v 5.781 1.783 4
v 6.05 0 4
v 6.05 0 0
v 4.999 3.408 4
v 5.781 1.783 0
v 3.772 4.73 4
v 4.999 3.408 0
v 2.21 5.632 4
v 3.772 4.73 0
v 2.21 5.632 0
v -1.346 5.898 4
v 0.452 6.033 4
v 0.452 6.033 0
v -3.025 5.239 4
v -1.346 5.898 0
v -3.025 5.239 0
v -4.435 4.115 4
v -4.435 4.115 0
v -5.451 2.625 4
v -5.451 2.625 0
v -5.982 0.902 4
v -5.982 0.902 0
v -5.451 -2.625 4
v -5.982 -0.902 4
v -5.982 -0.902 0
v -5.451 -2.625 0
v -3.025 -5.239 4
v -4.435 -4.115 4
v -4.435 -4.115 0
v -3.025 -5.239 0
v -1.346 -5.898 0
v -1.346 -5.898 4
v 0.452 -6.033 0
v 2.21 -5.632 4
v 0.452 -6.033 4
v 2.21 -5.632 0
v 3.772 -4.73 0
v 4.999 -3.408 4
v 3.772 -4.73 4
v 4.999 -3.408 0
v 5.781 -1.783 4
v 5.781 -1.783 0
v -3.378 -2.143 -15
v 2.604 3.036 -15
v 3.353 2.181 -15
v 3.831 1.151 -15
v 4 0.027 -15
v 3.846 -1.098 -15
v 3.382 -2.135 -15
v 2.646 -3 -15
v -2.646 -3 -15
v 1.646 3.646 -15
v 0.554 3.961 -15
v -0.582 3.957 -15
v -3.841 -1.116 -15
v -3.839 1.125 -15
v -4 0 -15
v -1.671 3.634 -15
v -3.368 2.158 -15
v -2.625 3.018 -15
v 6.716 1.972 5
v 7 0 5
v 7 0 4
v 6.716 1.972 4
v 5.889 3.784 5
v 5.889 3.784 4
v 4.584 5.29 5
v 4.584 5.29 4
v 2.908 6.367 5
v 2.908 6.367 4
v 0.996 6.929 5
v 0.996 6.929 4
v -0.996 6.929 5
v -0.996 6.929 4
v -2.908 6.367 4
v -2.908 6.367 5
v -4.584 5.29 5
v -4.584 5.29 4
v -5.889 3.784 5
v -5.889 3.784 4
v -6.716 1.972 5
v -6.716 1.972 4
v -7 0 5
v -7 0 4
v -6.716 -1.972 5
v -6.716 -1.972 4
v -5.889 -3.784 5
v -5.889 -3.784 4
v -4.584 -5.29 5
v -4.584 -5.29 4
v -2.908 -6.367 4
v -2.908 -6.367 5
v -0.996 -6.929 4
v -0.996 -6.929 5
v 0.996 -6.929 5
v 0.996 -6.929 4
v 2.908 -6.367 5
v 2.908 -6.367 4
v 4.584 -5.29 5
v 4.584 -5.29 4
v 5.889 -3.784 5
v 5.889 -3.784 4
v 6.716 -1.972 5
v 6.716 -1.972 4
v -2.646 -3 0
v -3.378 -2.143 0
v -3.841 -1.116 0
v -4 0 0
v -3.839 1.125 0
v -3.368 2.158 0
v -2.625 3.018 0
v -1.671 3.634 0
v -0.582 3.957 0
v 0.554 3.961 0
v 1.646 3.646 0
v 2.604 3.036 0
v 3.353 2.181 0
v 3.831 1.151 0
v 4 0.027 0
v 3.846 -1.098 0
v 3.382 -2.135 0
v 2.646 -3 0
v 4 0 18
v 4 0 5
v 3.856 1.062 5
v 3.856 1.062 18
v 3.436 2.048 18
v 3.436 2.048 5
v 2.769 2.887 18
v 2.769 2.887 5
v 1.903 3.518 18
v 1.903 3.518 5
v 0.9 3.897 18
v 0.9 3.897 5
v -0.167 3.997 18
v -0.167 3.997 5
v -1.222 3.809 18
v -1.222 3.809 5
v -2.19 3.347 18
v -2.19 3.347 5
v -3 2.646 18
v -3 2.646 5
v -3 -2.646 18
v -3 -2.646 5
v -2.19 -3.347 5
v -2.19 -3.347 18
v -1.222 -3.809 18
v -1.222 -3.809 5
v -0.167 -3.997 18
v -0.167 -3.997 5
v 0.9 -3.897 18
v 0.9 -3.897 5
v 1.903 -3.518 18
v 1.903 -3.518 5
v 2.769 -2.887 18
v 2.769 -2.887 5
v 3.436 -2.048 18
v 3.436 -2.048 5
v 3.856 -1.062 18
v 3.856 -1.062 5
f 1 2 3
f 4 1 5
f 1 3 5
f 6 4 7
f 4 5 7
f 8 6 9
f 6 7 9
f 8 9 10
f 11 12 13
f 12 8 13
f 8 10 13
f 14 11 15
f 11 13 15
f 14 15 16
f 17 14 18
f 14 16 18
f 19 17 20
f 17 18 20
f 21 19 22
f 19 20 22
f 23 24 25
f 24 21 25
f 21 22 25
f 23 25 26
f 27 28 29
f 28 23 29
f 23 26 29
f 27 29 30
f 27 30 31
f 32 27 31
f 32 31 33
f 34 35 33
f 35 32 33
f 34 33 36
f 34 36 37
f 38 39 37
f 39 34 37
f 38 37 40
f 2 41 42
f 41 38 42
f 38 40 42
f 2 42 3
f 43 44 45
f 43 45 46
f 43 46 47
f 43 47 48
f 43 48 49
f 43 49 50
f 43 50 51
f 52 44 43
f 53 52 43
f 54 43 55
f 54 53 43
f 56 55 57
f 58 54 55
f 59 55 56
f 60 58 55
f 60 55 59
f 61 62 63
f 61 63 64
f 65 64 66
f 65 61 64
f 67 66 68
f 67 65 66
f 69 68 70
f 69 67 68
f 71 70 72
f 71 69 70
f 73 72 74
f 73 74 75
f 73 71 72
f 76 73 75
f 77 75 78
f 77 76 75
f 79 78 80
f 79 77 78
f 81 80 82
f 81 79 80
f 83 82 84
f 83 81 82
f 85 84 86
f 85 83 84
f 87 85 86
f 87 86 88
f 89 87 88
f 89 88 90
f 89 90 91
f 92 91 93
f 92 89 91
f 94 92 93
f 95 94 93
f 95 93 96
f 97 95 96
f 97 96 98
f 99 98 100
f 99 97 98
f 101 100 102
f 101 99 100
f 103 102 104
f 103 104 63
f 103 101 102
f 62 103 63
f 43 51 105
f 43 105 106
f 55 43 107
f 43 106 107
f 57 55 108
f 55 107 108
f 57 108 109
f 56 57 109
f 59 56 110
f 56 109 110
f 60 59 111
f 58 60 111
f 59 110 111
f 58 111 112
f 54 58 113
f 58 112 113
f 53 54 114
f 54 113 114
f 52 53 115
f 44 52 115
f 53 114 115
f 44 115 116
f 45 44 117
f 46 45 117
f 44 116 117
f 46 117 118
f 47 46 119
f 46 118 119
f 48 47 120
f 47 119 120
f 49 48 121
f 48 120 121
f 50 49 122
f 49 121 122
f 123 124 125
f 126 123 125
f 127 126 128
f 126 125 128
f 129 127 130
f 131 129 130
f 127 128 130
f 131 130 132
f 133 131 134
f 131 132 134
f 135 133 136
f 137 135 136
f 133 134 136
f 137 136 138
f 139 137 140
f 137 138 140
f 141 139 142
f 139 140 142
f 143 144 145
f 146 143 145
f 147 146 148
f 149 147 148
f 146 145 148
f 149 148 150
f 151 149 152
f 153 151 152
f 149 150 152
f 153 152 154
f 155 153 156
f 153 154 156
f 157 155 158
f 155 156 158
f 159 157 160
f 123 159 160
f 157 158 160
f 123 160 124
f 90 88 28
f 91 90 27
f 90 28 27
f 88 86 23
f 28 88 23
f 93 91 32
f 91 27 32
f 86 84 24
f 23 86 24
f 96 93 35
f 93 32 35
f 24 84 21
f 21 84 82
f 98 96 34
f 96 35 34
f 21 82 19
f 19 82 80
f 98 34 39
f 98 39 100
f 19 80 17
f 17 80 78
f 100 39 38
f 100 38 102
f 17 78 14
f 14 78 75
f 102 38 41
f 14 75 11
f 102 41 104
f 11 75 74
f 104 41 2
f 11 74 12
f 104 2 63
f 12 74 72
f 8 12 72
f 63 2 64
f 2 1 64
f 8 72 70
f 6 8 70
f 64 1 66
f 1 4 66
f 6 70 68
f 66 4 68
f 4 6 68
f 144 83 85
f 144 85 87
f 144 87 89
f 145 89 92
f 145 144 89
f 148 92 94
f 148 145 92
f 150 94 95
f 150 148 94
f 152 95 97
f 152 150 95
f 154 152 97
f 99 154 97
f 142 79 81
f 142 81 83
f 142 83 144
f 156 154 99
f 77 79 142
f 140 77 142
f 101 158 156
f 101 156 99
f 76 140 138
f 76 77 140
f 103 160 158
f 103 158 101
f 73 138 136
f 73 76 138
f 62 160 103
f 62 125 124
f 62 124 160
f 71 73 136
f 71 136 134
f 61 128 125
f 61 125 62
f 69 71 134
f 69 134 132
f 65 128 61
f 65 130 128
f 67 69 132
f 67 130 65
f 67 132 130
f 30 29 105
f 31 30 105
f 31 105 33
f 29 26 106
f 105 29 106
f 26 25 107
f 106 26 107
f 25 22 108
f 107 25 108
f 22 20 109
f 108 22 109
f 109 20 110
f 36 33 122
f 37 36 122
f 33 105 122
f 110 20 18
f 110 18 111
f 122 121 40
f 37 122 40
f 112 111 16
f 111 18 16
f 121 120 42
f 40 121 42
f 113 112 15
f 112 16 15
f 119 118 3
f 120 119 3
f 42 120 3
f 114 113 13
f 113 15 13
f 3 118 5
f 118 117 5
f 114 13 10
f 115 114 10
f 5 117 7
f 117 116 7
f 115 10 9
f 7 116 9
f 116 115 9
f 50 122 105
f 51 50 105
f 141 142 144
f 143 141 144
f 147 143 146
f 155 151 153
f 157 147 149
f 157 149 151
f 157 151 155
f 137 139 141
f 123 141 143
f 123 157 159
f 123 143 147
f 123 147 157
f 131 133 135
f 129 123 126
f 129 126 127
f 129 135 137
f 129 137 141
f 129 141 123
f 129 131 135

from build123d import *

# Parameters (mm, degrees)
SKETCH_1_R      = 6.05
EXTRUDE_1_DEPTH = 5
SKETCH_7_R      = 7
EXTRUDE_6_DEPTH = 1
EXTRUDE_2_DEPTH = 13
EXTRUDE_3_DEPTH = 15


with BuildPart() as part:
    # 草图1 → 凸台-拉伸1 (new body)
    with BuildSketch(Plane.XY):
        Circle(SKETCH_1_R)
    extrude(amount=EXTRUDE_1_DEPTH)

    # 草图7 → 凸台-拉伸6 (add)
    with BuildSketch(Plane.XY.offset(5)):
        Circle(SKETCH_7_R)
    extrude(amount=-EXTRUDE_6_DEPTH)

    # 草图2 → 凸台-拉伸2 (add)
    with BuildSketch(Plane.XY.offset(5)):
        with BuildLine():
            ThreePointArc((4, 0), (1.414213562, 3.741657387), (-3, 2.645751311))
            Line((-3, 2.645751311), (-3, -2.645751311))
            ThreePointArc((-3, -2.645751311), (1.414213562, -3.741657387), (4, 0))
        make_face()
    extrude(amount=EXTRUDE_2_DEPTH)

    # 草图4 → 凸台-拉伸3 (add)
    with BuildSketch(Plane(origin=(0, 0, 0), x_dir=(-1, 0, 0), z_dir=(0, 0, -1))):
        with BuildLine():
            ThreePointArc((4, 0), (-1.645751311, 3.645751311), (-2.645751311, -3))
            Line((-2.645751311, -3), (2.645751311, -3))
            ThreePointArc((2.645751311, -3), (3.645751311, -1.645751311), (4, 0))
        make_face()
    extrude(amount=EXTRUDE_3_DEPTH)


solid = part.part
